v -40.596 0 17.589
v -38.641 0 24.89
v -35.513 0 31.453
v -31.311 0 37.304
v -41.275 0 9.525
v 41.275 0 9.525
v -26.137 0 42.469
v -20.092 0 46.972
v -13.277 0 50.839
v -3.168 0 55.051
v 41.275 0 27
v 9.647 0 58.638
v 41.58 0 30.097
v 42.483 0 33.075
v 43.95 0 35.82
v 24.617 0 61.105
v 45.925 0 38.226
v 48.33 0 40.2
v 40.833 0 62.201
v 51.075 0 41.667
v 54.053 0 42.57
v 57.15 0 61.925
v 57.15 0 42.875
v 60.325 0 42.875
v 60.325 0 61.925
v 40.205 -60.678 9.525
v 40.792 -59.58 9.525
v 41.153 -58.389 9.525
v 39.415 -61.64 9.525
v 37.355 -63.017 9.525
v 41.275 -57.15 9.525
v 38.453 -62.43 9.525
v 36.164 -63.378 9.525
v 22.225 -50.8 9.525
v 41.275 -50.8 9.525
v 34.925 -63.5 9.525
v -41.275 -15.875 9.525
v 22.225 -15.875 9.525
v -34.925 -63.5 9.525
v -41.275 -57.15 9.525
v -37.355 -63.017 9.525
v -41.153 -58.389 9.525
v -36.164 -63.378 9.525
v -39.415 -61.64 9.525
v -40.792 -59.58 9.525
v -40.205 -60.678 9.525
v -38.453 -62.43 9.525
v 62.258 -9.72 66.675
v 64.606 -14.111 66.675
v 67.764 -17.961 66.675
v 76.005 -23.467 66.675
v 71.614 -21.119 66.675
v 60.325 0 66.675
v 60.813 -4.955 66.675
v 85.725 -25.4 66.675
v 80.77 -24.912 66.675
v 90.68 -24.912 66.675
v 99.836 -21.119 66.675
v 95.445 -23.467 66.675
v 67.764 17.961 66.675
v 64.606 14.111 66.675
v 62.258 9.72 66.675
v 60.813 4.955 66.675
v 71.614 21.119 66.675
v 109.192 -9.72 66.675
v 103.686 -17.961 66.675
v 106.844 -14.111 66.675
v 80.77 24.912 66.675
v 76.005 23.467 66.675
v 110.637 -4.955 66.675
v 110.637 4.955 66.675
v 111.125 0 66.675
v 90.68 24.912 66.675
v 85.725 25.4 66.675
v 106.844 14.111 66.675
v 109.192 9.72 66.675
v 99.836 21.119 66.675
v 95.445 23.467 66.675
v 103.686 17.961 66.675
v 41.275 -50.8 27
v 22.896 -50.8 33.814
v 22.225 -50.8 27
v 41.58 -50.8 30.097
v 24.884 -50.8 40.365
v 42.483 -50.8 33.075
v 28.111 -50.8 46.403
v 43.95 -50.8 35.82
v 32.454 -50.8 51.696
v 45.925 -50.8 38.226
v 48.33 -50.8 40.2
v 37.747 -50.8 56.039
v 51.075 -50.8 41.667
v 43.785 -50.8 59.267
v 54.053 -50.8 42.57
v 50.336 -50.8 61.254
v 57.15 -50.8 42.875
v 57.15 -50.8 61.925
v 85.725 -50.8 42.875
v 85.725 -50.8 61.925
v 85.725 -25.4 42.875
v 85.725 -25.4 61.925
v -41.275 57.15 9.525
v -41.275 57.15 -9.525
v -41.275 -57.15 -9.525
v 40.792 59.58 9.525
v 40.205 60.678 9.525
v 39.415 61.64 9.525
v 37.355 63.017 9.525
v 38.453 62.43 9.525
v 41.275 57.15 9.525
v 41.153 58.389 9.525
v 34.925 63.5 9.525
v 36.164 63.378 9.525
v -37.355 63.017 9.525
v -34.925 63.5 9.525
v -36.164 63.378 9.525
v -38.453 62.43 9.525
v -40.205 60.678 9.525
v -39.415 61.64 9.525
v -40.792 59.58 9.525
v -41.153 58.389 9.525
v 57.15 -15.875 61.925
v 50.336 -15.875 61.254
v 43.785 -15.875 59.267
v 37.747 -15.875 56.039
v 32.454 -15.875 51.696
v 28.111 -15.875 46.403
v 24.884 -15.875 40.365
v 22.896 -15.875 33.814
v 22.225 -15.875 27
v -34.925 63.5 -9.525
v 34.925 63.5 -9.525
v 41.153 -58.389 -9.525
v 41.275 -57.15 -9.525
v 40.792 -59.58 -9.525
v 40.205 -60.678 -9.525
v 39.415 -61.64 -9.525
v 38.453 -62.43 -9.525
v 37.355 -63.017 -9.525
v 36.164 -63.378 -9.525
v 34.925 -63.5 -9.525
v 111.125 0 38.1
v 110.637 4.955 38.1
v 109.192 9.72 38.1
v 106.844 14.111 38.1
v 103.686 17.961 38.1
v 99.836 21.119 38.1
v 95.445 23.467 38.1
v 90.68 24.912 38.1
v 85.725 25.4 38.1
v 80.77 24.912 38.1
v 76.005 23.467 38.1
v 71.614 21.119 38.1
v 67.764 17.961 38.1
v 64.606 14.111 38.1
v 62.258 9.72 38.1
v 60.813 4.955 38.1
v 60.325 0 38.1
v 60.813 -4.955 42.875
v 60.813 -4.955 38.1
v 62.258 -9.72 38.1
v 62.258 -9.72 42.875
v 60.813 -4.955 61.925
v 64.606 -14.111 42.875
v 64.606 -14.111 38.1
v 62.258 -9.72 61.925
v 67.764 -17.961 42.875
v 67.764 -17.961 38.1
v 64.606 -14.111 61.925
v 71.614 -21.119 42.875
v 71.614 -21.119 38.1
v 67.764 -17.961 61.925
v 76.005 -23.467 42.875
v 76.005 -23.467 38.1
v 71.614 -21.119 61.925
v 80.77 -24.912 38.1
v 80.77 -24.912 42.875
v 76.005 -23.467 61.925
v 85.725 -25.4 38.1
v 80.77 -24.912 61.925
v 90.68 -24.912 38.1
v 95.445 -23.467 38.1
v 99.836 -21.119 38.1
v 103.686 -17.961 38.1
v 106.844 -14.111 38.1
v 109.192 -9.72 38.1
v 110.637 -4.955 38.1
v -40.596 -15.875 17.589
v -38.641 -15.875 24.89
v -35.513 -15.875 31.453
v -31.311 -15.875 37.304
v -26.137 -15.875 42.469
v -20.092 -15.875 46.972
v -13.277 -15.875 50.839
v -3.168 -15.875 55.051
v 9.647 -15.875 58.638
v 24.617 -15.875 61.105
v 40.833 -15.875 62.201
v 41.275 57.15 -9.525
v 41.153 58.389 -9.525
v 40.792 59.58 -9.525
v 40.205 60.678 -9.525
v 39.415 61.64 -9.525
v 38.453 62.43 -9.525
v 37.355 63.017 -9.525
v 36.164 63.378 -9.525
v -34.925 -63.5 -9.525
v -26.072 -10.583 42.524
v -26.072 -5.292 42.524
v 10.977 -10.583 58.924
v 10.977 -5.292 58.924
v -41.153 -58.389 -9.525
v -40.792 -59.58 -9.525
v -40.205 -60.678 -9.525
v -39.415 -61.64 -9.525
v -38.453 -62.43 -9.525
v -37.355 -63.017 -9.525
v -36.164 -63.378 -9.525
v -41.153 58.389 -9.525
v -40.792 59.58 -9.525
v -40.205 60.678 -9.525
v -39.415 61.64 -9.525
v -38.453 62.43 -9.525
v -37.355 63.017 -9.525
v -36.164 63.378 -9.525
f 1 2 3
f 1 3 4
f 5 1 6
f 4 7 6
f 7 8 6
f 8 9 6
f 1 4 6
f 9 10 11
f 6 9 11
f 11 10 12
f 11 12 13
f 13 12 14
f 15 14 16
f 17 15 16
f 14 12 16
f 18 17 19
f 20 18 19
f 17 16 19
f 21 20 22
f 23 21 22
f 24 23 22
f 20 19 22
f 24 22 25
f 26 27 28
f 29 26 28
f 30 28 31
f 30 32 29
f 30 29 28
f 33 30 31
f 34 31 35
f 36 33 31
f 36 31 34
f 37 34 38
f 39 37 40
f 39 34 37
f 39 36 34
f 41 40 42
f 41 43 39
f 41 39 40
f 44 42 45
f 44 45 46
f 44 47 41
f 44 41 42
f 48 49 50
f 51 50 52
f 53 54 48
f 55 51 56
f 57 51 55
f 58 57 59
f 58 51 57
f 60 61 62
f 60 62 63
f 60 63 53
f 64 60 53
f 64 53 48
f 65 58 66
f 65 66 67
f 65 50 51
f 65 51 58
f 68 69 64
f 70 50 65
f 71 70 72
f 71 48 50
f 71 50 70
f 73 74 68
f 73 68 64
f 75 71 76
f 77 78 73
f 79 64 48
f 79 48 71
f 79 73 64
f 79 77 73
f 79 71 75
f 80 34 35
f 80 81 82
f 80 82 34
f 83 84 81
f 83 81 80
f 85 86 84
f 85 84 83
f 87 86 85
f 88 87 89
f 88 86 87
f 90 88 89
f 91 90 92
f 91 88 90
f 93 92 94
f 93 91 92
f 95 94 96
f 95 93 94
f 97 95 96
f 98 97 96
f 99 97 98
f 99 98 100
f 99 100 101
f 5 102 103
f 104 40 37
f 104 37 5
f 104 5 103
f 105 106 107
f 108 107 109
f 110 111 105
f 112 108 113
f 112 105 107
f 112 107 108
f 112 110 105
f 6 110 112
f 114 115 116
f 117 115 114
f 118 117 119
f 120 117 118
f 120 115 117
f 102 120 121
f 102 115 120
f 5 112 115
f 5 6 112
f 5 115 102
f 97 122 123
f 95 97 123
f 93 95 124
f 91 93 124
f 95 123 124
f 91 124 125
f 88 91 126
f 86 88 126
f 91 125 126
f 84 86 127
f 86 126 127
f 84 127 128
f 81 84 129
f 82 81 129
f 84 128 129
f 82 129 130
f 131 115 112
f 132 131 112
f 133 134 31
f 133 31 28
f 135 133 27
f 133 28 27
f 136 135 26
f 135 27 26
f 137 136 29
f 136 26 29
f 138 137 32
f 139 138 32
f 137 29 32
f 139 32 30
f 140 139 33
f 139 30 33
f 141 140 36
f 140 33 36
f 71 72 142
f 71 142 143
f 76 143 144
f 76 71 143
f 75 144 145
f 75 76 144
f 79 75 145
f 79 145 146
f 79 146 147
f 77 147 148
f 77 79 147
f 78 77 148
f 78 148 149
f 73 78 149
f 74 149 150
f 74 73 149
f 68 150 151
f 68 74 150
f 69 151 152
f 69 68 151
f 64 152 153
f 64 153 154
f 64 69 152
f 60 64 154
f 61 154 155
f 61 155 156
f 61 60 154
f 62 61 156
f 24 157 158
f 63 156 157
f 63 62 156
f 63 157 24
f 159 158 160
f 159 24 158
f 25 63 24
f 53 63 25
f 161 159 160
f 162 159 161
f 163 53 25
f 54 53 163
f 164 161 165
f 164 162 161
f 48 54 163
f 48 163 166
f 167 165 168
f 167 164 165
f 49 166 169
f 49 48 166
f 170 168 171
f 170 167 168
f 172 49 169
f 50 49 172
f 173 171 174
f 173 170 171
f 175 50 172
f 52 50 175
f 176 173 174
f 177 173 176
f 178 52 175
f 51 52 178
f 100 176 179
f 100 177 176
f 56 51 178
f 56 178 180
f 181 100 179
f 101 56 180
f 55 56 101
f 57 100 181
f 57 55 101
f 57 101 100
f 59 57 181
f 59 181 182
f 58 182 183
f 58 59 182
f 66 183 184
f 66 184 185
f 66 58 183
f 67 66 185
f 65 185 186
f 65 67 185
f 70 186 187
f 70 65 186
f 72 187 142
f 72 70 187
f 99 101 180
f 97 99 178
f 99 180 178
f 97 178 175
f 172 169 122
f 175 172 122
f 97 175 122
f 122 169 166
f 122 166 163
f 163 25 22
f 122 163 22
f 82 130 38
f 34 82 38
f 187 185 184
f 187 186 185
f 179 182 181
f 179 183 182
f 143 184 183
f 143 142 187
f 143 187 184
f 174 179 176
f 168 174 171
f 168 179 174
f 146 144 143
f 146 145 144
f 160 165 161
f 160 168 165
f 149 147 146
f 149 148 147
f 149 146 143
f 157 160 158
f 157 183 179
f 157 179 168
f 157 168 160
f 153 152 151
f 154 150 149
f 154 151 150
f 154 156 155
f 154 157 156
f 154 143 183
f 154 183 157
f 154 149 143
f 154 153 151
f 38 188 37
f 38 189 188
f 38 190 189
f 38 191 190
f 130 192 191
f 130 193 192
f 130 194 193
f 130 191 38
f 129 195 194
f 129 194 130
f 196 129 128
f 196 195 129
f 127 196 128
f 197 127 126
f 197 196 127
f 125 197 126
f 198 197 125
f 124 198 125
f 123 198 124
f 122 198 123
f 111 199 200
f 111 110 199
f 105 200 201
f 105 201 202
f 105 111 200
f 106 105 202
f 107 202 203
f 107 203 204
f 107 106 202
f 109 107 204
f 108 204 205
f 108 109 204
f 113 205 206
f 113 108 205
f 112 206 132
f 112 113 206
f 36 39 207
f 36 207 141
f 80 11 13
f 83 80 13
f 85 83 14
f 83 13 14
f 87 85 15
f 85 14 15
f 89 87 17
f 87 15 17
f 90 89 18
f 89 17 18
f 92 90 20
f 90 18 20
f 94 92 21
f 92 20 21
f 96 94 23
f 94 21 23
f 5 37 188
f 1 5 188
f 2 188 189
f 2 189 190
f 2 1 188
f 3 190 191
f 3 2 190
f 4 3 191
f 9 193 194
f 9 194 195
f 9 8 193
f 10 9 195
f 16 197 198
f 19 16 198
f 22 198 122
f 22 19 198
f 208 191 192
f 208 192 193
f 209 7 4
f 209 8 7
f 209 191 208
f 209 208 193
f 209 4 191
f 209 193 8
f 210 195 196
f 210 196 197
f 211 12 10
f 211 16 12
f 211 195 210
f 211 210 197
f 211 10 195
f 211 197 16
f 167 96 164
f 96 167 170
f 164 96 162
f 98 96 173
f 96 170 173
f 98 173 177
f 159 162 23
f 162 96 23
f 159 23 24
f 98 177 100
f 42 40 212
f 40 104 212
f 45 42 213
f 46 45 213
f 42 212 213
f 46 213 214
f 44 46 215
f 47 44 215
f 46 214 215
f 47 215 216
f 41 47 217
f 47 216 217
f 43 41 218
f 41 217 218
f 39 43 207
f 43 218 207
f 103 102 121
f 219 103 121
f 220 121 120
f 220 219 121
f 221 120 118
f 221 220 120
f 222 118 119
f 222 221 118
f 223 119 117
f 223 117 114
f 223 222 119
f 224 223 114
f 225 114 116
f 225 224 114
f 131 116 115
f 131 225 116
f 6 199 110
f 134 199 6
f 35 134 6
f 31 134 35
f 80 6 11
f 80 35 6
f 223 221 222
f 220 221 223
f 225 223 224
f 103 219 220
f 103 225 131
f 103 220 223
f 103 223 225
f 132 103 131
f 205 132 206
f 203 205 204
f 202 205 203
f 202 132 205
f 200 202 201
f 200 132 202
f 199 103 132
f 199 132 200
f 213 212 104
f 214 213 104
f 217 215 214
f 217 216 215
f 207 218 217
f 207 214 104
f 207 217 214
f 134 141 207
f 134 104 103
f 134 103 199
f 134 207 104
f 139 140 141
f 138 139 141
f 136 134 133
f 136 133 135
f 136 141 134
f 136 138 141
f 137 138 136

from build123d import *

# Parameters (mm, degrees)
F1_DEPTH = 63.5
F2_DEPTH = 50.8
F3_DEPTH = 15.875
F5_R     = 6.35


with BuildPart() as f1:
    # F0 (on Front) → F1 (new body, symmetric)
    with BuildSketch(Plane.XZ):
        Polygon((41.275, -9.525), (41.275, 9.525), (22.225, 9.525), (-41.275, 9.525), (-41.275, -9.525), align=None)
    extrude(amount=F1_DEPTH, both=True)

    # F0 (on Front) → F2 (join)
    with BuildSketch(Plane.XZ):
        with BuildLine():
            Line((22.225, 9.525), (41.275, 9.525))
            Line((41.275, 9.525), (41.275, 27.0002))
            ThreePointArc((41.275, 27.0002), (45.92468, 38.22552), (57.15, 42.8752))
            Line((57.15, 42.8752), (60.325, 42.8752))
            Line((60.325, 42.8752), (60.325, 61.9252))
            Line((60.325, 61.9252), (57.15, 61.9252))
            ThreePointArc((57.15, 61.9252), (32.454296, 51.695904), (22.225, 27.0002))
            Line((22.225, 27.0002), (22.225, 9.525))
        make_face()
        Polygon((60.325, 61.9252), (60.325, 42.8752), (74.941066, 42.8752), (85.725, 42.8752), (85.725, 61.9252), (74.941066, 61.9252), align=None)
    extrude(amount=F2_DEPTH)

    # F0 (on Front) → F3 (join)
    with BuildSketch(Plane.XZ):
        with BuildLine():
            Line((-41.275, 9.525), (22.225, 9.525))
            Line((22.225, 9.525), (22.225, 27.0002))
            ThreePointArc((22.225, 27.0002), (32.454296, 51.695904), (57.15, 61.9252))
            add(Edge.make_bspline(
                [(-41.275, 9.525), (-41.235335, 51.891662), (10.656322, 64.555697), (57.15, 61.9252)],
                knots=[0, 0, 0, 0, 111.504536, 111.504536, 111.504536, 111.504536], degree=3))
        make_face()
    extrude(amount=F3_DEPTH)

    # F0 (on Front) → F4 (revolve)
    with BuildSketch(Plane.XZ):
        Polygon((85.725, 42.8752), (85.725, 38.1), (111.125, 38.1), (111.125, 66.675), (85.725, 66.675), (85.725, 61.9252), align=None)
    revolve(axis=Axis((85.725, 0, 52.3875), (0, 0, 1)))

    # F5
    f5_edges = [f1.edges().sort_by_distance(p)[0] for p in [
        (-41.275, -63.5, 0),
        (41.275, -63.5, 0),
        (41.275, 63.5, 0),
        (-41.275, 63.5, 0),
    ]]
    fillet(f5_edges, radius=F5_R)


solid = f1.part
